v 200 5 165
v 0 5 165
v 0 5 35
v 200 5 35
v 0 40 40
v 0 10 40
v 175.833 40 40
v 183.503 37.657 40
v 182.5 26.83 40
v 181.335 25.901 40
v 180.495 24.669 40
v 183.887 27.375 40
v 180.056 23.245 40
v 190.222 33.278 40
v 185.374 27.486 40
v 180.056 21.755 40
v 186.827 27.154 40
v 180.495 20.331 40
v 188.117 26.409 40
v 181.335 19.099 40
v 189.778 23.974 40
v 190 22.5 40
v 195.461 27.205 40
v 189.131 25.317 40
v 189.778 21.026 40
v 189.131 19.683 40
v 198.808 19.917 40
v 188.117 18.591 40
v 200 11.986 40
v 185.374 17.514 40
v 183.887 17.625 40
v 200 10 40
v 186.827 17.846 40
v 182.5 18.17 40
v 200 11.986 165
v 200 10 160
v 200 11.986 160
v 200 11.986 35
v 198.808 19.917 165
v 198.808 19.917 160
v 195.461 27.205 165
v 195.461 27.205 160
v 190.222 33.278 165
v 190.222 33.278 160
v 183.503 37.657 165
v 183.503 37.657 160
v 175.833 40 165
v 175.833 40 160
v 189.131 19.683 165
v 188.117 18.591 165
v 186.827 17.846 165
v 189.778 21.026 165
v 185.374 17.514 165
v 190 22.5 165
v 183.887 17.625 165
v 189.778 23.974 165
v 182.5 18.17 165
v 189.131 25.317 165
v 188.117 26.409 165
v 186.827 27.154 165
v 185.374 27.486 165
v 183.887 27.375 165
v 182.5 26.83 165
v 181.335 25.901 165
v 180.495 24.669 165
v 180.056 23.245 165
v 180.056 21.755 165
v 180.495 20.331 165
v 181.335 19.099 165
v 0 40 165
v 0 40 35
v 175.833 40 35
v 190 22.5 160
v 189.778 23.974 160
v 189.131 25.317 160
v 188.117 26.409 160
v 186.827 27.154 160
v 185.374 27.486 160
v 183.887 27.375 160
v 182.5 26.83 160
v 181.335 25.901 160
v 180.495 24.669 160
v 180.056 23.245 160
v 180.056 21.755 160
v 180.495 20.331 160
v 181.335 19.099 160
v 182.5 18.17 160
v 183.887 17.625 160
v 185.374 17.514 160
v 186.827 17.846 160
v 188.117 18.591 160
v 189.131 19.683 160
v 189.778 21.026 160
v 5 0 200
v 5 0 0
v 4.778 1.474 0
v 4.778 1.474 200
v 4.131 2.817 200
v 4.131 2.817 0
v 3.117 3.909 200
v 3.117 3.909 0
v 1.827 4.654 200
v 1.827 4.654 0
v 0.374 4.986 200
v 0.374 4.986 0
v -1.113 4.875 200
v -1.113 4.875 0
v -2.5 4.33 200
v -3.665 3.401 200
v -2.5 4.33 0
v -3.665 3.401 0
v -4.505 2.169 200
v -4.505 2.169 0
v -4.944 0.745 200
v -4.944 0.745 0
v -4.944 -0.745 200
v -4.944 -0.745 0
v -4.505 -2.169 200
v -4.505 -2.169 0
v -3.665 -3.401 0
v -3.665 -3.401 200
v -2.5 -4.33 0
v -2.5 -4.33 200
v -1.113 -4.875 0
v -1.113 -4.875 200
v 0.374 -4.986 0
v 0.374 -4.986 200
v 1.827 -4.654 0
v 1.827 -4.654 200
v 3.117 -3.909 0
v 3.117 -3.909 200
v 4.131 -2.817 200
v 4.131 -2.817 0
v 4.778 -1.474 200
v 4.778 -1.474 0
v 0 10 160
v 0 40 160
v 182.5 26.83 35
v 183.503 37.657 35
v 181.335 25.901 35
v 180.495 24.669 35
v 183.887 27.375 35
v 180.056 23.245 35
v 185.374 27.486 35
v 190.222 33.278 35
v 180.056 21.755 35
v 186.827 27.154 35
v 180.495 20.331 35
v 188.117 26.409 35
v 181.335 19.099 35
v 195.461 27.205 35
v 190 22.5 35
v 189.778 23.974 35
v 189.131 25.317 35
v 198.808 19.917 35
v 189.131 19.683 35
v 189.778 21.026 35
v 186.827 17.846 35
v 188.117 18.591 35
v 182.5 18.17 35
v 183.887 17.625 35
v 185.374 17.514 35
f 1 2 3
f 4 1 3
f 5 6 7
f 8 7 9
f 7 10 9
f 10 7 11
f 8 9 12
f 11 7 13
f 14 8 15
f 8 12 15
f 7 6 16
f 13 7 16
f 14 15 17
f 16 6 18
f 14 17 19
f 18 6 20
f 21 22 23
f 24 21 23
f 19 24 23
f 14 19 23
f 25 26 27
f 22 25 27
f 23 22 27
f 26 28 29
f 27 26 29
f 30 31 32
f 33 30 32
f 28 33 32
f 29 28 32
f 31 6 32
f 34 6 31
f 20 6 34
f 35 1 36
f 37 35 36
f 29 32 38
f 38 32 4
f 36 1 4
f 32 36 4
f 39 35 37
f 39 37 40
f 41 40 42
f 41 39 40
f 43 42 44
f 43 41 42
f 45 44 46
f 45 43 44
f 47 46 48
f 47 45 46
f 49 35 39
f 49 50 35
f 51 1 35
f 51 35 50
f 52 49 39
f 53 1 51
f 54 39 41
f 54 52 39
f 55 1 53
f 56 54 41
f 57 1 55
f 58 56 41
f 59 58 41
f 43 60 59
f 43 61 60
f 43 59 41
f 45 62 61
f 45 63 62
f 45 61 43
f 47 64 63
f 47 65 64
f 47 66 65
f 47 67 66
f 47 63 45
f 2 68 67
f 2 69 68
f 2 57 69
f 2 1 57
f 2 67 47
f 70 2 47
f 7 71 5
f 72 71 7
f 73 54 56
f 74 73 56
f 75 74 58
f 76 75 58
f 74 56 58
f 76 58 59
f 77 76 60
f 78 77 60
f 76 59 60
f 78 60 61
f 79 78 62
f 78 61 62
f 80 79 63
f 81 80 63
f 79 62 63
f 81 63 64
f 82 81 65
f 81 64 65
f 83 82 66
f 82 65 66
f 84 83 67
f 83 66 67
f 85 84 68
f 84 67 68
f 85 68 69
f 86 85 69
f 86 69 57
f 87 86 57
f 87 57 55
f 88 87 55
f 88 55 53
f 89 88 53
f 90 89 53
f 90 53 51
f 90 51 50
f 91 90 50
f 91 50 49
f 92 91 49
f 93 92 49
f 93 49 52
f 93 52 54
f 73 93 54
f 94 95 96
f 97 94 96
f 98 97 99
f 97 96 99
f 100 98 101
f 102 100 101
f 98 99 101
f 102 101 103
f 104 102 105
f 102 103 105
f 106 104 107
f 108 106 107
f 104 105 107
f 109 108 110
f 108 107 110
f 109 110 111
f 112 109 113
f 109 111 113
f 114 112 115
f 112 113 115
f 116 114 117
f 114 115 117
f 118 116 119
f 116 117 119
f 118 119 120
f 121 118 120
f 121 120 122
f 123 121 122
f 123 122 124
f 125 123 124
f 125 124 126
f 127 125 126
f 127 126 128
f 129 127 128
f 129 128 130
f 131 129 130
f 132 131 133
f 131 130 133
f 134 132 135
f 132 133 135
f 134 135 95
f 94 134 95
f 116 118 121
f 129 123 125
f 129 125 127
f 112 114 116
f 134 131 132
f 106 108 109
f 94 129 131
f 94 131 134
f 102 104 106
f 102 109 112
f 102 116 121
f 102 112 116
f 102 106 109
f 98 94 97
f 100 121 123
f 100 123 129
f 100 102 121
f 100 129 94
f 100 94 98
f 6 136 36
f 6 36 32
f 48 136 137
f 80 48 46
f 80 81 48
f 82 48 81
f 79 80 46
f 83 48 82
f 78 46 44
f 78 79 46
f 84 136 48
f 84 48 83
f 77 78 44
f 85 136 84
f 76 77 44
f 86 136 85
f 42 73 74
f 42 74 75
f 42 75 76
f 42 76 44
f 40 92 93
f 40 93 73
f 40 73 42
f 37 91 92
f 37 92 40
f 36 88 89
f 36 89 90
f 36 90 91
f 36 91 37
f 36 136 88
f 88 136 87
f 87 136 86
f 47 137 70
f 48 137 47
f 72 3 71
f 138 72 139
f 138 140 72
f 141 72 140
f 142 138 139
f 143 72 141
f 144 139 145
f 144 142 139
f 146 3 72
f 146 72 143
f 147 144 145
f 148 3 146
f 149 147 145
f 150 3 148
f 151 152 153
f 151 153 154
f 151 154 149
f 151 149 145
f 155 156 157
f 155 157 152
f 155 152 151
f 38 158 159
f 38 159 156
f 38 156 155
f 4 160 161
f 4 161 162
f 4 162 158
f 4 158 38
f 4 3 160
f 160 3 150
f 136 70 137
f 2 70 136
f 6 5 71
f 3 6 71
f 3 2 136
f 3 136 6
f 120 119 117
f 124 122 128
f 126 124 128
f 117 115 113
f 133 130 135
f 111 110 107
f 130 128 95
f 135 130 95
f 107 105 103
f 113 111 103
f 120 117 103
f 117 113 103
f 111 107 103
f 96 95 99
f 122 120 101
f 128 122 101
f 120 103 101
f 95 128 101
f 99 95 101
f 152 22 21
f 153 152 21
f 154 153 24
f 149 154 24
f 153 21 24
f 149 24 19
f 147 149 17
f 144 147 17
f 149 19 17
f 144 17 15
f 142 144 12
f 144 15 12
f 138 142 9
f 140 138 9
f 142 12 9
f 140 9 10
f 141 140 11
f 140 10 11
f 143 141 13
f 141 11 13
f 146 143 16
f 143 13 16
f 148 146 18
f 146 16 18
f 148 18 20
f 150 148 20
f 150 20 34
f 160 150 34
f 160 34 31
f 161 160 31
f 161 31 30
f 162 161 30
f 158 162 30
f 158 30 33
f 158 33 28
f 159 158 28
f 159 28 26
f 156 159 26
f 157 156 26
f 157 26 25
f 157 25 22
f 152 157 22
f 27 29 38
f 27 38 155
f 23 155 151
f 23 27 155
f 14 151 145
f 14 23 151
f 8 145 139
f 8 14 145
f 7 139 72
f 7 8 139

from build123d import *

# Parameters (mm, degrees)
SKETCH1_R           = 5
BOSS_EXTRUDE1_DEPTH = 200
SKETCH2_W           = 130
SKETCH2_H           = 5
BOSS_EXTRUDE2_DEPTH = 200
SKETCH3_W           = 200
SKETCH3_H           = 5
BOSS_EXTRUDE3_DEPTH = 30
SKETCH4_R           = 5
CUT_EXTRUDE1_DEPTH  = 263.345192447
CUT_EXTRUDE2_DEPTH  = 263.345192447


with BuildPart() as part:
    # Sketch1 → Boss-Extrude1 (new body)
    with BuildSketch(Plane.XY):
        Circle(SKETCH1_R)
    extrude(amount=BOSS_EXTRUDE1_DEPTH)


with BuildPart() as body_2:
    # Sketch2 → Boss-Extrude2 (new body)
    with BuildSketch(Plane(origin=(0, 0, 0), x_dir=(0, 0, -1), z_dir=(1, 0, 0))):
        with Locations((-100, 7.5)):
            Rectangle(SKETCH2_W, SKETCH2_H)
    extrude(amount=BOSS_EXTRUDE2_DEPTH)

    # Sketch3 → Boss-Extrude3 (add)
    with BuildSketch(Plane(origin=(0, 10, 0), x_dir=(1, 0, 0), z_dir=(0, 1, 0))):
        with Locations((100, -37.5)):
            Rectangle(SKETCH3_W, SKETCH3_H)
        with Locations((100, -162.5)):
            Rectangle(SKETCH3_W, SKETCH3_H)
    extrude(amount=BOSS_EXTRUDE3_DEPTH)

    # Sketch4 → Cut-Extrude1 (cut, through all)
    with BuildSketch(Plane.XY.offset(165)):
        with Locations((185, 22.5)):
            Circle(SKETCH4_R)
    extrude(amount=-CUT_EXTRUDE1_DEPTH, mode=Mode.SUBTRACT)

    # Sketch5 → Cut-Extrude2 (cut, through all)
    with BuildSketch(Plane.XY.offset(165)):
        with BuildLine():
            Line((175.8328498, 40), (193.165721177, 65.010867295))
            Line((193.165721177, 65.010867295), (236.634308573, 44.851522415))
            Line((236.634308573, 44.851522415), (213.857727293, 11.985528119))
            Line((213.857727293, 11.985528119), (200, 11.985528119))
            ThreePointArc((200, 11.985528119), (193.055131936, 30.425755169), (175.8328498, 40))
        make_face()
    extrude(amount=-CUT_EXTRUDE2_DEPTH, mode=Mode.SUBTRACT)


solid = Compound([part.part, body_2.part])
